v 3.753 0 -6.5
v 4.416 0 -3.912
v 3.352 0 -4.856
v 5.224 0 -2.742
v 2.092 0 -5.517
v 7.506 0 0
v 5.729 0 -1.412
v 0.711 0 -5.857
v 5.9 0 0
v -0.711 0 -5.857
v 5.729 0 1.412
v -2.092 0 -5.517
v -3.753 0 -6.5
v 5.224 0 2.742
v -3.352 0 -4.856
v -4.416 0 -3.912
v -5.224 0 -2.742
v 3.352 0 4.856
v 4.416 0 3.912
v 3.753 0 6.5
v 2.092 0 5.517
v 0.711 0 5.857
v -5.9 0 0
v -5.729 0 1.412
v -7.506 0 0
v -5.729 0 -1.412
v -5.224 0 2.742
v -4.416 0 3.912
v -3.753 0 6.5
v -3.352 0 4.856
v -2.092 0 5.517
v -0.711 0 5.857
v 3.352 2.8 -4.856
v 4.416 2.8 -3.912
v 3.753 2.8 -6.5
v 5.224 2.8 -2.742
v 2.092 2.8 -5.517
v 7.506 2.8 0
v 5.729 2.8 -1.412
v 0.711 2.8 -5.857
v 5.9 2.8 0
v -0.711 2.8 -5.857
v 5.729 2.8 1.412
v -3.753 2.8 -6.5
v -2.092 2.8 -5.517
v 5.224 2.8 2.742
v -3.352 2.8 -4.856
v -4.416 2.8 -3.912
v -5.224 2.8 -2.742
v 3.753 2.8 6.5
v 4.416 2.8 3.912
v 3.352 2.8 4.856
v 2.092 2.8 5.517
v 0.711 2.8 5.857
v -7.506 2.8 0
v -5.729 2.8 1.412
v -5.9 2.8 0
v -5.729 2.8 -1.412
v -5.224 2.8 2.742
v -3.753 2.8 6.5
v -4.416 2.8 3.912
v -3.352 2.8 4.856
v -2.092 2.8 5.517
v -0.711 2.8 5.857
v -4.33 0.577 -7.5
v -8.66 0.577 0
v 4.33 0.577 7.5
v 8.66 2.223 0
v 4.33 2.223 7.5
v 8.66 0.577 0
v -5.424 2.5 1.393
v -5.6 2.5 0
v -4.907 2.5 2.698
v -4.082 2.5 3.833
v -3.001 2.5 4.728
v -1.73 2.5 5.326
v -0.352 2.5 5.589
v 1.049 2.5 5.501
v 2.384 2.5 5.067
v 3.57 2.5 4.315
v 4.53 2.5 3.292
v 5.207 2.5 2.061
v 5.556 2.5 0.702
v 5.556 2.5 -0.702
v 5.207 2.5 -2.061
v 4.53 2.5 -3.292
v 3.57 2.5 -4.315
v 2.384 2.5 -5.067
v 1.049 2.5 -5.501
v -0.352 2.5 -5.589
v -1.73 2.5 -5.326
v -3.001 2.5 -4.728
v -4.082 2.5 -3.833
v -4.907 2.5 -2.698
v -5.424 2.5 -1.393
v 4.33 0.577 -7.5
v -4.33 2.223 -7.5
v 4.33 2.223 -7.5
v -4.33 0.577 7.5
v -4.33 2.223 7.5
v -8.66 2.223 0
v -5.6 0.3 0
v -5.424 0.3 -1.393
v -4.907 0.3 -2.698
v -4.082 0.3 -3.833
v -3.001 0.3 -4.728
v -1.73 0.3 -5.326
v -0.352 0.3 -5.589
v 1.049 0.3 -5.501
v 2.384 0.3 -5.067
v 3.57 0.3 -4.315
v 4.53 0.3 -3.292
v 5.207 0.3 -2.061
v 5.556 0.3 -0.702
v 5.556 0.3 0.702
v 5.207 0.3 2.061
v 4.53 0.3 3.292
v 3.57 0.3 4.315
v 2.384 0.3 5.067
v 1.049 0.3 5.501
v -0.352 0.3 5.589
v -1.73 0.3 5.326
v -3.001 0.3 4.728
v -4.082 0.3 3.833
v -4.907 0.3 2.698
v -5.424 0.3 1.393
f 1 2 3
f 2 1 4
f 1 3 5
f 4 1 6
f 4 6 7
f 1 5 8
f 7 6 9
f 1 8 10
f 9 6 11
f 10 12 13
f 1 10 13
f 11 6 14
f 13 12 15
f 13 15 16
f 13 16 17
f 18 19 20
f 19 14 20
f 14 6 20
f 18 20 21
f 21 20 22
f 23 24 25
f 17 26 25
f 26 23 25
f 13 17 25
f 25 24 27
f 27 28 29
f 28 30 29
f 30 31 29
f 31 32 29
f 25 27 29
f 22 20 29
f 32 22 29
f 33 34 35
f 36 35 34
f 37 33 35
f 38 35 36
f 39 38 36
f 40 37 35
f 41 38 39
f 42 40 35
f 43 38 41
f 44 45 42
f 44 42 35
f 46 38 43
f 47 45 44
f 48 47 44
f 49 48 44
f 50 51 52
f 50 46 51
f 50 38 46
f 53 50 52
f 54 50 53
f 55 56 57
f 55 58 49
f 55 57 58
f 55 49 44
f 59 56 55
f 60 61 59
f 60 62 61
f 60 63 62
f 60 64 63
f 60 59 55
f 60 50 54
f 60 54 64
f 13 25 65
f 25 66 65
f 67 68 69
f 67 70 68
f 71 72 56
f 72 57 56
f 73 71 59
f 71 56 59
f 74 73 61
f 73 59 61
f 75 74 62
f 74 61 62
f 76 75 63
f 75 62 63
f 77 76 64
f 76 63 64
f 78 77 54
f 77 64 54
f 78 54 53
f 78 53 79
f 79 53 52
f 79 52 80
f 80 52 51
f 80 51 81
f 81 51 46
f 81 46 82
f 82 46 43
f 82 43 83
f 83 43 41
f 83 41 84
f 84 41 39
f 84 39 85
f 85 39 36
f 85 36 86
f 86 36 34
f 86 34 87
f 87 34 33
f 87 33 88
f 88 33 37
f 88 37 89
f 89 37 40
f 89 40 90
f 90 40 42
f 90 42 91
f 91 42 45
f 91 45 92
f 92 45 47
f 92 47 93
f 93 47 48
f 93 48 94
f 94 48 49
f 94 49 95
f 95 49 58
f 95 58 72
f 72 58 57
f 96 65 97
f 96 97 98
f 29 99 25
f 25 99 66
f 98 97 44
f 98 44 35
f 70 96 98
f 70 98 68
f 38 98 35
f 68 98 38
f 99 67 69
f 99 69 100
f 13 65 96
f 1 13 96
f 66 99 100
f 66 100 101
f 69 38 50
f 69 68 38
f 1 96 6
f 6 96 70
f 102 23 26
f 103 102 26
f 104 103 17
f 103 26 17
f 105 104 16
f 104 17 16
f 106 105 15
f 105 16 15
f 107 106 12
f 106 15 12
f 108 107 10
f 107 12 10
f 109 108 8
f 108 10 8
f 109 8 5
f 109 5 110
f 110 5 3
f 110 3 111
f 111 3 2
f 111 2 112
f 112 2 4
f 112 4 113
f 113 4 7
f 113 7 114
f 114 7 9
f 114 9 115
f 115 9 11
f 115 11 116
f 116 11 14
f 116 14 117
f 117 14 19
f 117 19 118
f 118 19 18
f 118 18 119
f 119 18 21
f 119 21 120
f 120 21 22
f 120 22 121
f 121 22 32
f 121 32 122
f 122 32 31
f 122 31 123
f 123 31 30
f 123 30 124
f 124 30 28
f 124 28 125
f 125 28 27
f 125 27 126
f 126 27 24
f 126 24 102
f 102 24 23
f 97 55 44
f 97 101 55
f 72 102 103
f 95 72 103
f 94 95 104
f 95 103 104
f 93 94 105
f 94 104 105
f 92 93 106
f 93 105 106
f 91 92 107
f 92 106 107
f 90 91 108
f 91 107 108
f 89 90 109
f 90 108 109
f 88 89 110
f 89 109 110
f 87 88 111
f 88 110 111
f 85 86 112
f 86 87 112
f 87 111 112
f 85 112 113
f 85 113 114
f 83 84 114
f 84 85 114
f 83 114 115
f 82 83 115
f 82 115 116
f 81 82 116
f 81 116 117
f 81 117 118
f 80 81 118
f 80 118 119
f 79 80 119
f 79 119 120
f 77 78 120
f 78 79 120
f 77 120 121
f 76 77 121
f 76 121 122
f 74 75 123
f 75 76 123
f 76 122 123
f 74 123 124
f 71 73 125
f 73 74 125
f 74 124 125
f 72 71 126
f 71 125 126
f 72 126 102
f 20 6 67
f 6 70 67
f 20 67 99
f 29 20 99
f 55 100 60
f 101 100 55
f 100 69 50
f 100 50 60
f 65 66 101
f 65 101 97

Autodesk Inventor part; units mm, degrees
ref_plane "YZ Plane" through (0, 0, 0) normal (1, 0, 0) x (0, 1, 0)
ref_plane "XZ Plane" through (0, 0, 0) normal (0, 1, 0) x (-1, 0, 0)
ref_plane "XY Plane" through (0, 0, 0) normal (0, 0, 1) x (1, 0, 0)
sketch "Эскиз1" plane through (0, 0, 0) normal (0, 1, 0) x (-1, 0, 0)
  line L0 (-4.3301, -7.5) -> (-8.6603, 0)
  line L1 (-8.6603, 0) -> (-4.3301, 7.5)
  line L2 (-4.3301, 7.5) -> (4.3301, 7.5)
  line L3 (4.3301, 7.5) -> (8.6603, 0)
  line L4 (8.6603, 0) -> (4.3301, -7.5)
  line L5 (4.3301, -7.5) -> (-4.3301, -7.5)
  circle A0 centre (0, 0) radius 5.6
  dimension "d0" = 15
  dimension "d1" = 11.2
extrude "Выдавливание1" add sketch "Эскиз1" along normal blind 2.8
chamfer "Фаска1" distance 1 angle 30 6 edges at (0, 2.8, 7.5) (6.4952, 2.8, 3.75) (6.4952, 2.8, -3.75) (0, 2.8, -7.5) (-6.4952, 2.8, -3.75) (-6.4952, 2.8, 3.75) measured on face at (0.225, 2.8, 6.8531)
chamfer "Фаска2" distance 1 angle 30 6 edges at (-6.4952, 0, 3.75) (0, 0, 7.5) (6.4952, 0, 3.75) (6.4952, 0, -3.75) (0, 0, -7.5) (-6.4952, 0, -3.75) measured on face at (0.225, 0, 6.8531)
thread "Резьба1" size "M12x0.75" class "6H" standard "ANSI Metric M Profile" full length
chamfer "Фаска3" distance 0.3 angle 45 2 edges at (5.6, 2.8, 0) (5.6, 0, 0)
properties part number "гайка" material "Сталь, нержавеющая, полированная"
